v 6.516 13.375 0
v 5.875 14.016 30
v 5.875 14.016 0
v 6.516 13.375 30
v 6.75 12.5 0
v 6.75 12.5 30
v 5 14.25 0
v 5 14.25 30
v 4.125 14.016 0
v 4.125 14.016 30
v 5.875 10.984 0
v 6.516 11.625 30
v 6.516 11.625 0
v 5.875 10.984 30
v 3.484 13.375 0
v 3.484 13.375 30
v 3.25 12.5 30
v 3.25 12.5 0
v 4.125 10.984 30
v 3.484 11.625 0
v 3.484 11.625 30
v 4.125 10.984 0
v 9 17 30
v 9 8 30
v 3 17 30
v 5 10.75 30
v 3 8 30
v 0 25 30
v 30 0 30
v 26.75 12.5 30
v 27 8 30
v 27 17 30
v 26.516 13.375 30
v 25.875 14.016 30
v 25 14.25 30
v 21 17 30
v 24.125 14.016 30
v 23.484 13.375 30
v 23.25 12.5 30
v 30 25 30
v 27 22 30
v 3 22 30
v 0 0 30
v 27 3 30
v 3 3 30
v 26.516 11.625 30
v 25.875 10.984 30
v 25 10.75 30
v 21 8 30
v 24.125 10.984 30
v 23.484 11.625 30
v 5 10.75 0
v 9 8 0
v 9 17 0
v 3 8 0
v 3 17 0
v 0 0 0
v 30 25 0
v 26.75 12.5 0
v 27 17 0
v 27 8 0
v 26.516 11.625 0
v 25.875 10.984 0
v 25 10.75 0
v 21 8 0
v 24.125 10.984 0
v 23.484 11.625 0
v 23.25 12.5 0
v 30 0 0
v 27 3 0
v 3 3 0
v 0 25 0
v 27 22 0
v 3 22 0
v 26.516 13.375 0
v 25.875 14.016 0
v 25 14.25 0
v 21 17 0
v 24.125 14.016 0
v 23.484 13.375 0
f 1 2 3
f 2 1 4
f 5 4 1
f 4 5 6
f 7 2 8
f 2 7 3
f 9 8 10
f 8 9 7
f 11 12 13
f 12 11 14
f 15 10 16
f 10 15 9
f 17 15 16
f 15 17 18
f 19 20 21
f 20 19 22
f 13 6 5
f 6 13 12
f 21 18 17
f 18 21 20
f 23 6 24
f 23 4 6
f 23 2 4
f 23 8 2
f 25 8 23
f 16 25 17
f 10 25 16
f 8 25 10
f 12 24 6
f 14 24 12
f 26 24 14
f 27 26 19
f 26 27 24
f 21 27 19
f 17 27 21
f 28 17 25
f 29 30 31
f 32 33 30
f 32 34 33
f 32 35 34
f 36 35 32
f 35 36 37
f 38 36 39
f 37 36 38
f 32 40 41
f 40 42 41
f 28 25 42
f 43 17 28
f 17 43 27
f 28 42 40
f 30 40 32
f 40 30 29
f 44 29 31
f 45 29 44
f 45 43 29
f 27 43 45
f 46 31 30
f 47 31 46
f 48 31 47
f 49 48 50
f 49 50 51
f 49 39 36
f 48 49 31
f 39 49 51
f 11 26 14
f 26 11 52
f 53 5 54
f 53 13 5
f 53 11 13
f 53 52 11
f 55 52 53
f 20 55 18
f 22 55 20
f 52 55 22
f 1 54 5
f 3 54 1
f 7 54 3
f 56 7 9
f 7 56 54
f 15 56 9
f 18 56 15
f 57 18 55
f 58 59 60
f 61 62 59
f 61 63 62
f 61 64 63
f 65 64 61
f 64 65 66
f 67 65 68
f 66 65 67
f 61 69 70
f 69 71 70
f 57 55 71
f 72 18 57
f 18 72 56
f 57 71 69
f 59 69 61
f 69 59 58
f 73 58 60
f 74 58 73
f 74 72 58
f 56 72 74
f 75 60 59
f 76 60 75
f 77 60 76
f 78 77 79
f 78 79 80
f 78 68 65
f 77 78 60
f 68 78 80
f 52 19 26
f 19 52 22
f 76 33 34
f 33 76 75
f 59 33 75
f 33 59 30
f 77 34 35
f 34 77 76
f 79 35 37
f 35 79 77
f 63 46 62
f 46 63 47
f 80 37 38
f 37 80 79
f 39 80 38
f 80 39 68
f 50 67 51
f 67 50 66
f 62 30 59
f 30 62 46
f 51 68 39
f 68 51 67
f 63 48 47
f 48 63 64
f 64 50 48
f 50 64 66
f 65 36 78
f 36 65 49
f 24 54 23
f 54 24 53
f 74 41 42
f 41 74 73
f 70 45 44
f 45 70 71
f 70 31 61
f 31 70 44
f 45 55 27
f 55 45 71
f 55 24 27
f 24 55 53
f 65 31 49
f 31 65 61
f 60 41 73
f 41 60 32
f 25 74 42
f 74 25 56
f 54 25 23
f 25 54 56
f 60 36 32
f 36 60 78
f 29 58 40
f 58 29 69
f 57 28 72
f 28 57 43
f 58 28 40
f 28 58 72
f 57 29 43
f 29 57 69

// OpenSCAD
ht=30;

difference()
{
    
    cube([30,25,ht]);
    
    union()
    {
        translate([5,25/2,0])
            cylinder(d=3.5,h=ht,$fn=12);
        translate([30-5,25/2,0])
            cylinder(d=3.5,h=ht,$fn=12);
        
        translate([9,3,0])
            cube([30-9*2,25-3*2,ht]);
        translate([3,3,0])
            cube([30-3*2,5,ht]);
        translate([3,25-5-3,0])
            cube([30-3*2,5,ht]);
    }
}
